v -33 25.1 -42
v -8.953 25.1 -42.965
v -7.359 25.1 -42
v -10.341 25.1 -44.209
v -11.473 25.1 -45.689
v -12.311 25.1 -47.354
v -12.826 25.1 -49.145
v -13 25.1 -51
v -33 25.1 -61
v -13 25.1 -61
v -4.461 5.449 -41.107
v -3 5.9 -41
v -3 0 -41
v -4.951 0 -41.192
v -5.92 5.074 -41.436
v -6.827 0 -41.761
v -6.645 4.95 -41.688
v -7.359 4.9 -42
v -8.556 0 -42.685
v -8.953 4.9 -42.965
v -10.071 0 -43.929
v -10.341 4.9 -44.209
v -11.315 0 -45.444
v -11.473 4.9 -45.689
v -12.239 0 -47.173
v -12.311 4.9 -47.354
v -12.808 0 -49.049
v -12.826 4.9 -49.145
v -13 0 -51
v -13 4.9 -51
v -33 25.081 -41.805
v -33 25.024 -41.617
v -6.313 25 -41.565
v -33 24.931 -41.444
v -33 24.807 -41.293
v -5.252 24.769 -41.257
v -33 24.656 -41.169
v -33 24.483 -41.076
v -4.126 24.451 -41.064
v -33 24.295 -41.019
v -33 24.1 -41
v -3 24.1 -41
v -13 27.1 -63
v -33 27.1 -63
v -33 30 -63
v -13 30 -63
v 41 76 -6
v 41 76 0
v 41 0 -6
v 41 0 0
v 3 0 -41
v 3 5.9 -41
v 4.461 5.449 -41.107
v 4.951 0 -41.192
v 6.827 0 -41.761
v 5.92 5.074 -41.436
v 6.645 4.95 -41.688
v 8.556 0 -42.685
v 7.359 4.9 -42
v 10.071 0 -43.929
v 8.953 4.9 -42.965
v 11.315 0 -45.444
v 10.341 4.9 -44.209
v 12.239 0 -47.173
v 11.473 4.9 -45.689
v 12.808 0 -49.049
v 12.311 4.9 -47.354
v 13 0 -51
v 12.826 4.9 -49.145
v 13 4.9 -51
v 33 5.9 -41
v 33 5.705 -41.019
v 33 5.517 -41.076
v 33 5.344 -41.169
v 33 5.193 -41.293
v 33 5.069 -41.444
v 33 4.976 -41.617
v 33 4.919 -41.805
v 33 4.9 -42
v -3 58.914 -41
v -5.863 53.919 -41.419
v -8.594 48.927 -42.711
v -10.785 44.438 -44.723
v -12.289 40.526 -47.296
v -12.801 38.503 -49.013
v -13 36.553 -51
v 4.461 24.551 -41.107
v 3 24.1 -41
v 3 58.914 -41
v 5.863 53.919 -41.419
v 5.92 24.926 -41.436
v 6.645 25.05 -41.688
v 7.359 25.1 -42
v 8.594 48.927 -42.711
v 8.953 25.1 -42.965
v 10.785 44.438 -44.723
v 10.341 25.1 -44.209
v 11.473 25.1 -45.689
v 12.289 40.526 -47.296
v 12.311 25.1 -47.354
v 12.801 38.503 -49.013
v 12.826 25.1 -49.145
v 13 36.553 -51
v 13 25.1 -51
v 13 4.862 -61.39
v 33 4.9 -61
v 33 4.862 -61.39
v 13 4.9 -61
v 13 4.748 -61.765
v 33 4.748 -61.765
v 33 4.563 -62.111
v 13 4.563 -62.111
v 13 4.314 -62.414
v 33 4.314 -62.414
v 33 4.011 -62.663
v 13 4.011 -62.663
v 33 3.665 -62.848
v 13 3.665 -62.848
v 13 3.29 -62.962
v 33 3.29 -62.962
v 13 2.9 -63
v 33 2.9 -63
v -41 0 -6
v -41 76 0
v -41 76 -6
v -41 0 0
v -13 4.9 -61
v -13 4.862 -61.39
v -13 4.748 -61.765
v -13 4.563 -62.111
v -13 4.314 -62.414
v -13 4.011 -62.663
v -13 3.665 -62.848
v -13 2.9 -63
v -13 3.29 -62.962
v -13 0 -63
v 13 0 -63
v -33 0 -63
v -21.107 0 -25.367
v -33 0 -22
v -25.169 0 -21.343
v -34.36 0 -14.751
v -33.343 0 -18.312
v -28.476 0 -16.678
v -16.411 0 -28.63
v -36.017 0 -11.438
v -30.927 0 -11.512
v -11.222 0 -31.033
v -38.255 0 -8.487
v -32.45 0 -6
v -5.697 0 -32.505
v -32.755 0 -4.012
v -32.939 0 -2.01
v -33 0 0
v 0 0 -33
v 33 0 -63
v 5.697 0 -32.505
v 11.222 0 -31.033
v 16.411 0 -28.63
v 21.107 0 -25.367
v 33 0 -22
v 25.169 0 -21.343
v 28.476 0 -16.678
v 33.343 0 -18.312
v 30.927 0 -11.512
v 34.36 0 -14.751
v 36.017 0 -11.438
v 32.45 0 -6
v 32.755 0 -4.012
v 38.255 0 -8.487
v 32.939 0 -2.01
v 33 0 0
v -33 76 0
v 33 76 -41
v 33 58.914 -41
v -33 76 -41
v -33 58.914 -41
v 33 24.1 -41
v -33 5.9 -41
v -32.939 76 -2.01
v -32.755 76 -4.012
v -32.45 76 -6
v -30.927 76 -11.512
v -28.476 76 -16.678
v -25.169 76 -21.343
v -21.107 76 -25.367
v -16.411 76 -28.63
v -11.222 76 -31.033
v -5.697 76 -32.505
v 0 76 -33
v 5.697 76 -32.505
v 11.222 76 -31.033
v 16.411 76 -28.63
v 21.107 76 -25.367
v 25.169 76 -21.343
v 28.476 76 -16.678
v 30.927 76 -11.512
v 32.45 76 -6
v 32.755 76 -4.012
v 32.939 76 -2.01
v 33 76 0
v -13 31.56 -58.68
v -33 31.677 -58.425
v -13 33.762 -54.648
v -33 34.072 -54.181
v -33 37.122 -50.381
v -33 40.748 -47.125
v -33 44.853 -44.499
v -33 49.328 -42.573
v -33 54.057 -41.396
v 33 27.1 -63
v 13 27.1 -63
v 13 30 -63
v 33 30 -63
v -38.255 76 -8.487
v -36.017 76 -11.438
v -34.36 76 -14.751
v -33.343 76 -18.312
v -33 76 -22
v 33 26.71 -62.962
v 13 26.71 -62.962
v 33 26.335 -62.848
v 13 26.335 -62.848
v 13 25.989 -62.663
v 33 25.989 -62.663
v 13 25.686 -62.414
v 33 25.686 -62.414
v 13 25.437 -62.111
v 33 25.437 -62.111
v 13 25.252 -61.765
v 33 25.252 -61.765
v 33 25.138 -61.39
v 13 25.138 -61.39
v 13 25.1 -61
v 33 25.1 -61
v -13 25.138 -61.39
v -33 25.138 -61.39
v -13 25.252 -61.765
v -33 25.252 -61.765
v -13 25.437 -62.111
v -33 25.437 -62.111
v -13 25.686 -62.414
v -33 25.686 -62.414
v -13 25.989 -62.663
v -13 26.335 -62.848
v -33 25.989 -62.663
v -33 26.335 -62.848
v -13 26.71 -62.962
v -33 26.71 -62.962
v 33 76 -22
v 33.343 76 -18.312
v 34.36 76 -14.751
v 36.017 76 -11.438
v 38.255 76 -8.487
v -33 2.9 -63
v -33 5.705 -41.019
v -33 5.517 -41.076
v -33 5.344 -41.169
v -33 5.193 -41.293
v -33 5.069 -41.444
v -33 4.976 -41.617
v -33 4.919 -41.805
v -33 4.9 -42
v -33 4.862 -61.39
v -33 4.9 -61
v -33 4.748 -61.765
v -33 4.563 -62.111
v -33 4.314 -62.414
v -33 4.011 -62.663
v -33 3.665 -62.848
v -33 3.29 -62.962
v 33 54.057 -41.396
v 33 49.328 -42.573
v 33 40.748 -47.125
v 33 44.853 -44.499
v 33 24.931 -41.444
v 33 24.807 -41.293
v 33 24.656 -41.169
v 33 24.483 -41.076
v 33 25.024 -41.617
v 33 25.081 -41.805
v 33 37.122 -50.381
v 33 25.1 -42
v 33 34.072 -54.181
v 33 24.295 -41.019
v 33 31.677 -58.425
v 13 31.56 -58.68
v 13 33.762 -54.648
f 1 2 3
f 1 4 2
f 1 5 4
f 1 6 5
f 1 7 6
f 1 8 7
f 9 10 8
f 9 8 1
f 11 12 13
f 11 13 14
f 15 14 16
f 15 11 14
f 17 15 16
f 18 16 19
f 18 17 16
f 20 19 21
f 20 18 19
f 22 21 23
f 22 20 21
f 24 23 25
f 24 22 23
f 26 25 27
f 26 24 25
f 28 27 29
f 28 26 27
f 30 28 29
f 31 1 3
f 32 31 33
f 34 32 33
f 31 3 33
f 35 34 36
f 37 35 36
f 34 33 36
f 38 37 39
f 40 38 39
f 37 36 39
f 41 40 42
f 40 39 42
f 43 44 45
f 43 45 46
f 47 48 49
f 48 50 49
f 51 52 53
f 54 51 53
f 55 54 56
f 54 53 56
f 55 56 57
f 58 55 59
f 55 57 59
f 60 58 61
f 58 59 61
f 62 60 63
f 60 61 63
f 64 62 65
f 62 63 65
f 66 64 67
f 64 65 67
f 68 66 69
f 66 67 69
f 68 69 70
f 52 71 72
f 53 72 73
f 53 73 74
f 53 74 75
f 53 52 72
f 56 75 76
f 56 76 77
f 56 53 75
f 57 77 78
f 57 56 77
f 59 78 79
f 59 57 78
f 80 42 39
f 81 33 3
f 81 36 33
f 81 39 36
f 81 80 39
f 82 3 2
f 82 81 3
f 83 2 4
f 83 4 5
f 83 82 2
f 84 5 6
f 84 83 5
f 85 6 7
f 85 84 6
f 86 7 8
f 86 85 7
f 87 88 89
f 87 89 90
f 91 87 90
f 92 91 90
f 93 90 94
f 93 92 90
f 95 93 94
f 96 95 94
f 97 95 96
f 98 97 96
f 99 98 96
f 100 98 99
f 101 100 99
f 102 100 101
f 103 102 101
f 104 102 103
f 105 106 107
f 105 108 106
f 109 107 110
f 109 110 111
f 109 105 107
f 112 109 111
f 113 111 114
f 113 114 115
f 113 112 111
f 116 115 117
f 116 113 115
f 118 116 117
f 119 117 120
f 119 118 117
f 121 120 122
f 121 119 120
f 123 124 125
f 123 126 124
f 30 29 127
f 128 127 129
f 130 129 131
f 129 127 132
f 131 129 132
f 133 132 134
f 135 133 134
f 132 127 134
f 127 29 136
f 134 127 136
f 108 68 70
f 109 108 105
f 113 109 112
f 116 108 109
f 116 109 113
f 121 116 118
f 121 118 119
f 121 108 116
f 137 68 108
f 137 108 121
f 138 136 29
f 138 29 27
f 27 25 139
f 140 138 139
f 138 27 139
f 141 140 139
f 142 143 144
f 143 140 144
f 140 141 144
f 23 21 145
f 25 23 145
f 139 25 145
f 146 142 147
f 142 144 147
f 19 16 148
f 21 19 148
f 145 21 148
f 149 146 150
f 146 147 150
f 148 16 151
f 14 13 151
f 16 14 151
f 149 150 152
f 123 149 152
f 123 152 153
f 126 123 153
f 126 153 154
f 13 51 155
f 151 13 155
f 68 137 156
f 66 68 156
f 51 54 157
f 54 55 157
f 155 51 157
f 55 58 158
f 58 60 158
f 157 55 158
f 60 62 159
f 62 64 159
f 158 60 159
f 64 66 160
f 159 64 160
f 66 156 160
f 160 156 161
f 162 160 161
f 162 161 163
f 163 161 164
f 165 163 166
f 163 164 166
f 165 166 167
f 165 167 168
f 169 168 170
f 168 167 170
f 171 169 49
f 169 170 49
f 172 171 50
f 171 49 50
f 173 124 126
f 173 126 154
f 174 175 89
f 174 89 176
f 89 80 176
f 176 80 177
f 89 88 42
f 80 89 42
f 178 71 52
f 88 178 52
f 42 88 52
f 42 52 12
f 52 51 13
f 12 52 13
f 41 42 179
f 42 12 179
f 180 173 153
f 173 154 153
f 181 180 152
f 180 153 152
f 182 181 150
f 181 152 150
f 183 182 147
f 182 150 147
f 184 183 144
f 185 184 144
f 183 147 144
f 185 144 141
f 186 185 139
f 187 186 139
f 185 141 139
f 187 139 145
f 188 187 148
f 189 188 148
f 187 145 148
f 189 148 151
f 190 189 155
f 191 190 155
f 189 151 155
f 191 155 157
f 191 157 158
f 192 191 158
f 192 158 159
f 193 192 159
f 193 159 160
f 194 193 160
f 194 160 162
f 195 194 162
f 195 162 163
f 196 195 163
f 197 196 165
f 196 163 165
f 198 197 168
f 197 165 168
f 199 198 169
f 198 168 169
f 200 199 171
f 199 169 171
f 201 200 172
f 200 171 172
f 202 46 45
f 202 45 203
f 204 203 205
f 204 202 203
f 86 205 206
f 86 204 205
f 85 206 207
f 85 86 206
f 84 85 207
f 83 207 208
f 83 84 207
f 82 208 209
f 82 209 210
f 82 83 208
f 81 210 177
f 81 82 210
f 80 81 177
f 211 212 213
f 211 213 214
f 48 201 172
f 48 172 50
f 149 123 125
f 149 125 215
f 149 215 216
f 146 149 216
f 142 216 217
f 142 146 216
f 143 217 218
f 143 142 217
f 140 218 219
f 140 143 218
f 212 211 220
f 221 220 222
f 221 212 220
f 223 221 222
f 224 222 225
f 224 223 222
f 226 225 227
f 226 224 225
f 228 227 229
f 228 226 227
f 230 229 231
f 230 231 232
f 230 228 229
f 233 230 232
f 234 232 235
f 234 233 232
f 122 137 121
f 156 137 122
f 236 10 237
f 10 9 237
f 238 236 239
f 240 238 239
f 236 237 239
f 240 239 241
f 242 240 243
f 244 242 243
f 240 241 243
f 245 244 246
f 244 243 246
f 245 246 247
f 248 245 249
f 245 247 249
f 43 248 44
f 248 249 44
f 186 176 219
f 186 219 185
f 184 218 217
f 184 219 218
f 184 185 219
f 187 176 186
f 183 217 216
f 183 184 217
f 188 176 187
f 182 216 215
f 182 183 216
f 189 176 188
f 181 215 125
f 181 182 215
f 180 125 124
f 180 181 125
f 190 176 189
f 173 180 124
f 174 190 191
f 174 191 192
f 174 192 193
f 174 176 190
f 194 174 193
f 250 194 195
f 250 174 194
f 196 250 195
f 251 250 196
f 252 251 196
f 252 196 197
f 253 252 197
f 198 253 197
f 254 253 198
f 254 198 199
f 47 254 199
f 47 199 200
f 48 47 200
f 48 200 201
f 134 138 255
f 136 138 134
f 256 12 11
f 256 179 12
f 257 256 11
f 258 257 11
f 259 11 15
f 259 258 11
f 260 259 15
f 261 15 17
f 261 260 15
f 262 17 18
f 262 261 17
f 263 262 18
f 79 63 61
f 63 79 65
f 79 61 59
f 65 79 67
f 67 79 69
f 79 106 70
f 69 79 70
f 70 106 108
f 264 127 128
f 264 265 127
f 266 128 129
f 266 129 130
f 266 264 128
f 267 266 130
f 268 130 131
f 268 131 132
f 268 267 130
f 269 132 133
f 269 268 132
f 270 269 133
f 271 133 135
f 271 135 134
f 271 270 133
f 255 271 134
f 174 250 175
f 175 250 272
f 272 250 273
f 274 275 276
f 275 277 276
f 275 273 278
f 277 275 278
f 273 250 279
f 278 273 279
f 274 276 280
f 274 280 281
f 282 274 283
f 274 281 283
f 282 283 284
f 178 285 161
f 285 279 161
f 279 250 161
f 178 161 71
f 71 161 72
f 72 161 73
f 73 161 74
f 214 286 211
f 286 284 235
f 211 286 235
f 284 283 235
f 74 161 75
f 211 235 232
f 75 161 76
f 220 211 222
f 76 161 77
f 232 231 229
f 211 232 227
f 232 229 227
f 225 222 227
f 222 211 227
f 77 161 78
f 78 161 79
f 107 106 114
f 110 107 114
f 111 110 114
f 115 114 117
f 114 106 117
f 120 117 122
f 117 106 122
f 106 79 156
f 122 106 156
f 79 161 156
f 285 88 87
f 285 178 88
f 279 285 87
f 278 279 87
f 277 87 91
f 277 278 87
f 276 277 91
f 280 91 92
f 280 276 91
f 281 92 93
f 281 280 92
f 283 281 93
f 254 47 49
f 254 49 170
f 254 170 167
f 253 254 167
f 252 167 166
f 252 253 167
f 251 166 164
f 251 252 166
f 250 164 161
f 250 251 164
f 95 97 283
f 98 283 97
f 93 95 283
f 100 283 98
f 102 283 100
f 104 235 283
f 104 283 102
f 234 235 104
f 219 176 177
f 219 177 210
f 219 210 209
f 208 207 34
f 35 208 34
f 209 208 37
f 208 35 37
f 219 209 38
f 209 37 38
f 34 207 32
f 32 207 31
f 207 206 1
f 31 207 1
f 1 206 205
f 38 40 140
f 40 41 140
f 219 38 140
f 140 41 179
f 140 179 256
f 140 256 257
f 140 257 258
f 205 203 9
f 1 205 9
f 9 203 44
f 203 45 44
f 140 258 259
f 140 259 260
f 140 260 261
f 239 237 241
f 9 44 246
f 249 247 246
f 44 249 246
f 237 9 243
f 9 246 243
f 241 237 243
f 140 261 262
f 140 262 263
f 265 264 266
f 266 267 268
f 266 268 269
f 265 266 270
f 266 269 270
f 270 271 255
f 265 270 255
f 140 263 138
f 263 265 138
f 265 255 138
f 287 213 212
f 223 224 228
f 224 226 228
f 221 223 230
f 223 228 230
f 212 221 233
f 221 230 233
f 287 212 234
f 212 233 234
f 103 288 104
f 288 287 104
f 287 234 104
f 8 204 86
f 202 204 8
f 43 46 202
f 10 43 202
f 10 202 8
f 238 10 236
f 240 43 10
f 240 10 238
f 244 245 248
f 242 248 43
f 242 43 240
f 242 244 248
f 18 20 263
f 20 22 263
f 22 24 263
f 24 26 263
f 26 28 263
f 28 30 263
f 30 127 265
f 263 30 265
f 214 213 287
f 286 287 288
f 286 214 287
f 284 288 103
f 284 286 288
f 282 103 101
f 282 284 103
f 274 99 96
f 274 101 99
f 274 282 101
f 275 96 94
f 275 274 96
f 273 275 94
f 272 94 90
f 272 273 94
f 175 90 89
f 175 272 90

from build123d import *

# Parameters (mm, degrees)
SKETCH1_W           = 8
SKETCH1_H           = 6
SKETCH1_W_2         = 20
SKETCH1_H_2         = 22
BOSS_EXTRUDE1_DEPTH = 30
SKETCH2_W           = 66
SKETCH2_H           = 20.2
CUT_EXTRUDE1_DEPTH  = 22
SKETCH3_W           = 8
SKETCH3_H           = 6
BOSS_EXTRUDE2_DEPTH = 46
FILLET1_R           = 30
FILLET2_R           = 20
FILLET3_R           = 10
FILLET4_R           = 2
FILLET5_R           = 1


with BuildPart() as part:
    # Sketch1 → Boss-Extrude1 (new body)
    with BuildSketch(Plane(origin=(0, 0, 0), x_dir=(1, 0, 0), z_dir=(0, 1, 0))):
        with BuildLine():
            Line((-13, 41), (-33, 41))
            Line((-33, 41), (-33, 6))
            Line((-33, 6), (-32.449961479, 6))
            ThreePointArc((-32.449961479, 6), (0, 33), (32.449961479, 6))
            Line((32.449961479, 6), (33, 6))
            Line((33, 6), (33, 41))
            Line((33, 41), (13, 41))
            Line((13, 41), (-13, 41))
        make_face()
        with Locations((-37, 3)):
            Rectangle(SKETCH1_W, SKETCH1_H)
        with BuildLine():
            Line((-32.449961479, 6), (-33, 6))
            Line((-33, 6), (-33, 0))
            ThreePointArc((-33, 0), (-32.862202671, 3.012579558), (-32.449961479, 6))
        make_face()
        with Locations((37, 3)):
            Rectangle(SKETCH1_W, SKETCH1_H)
        with BuildLine():
            ThreePointArc((32.449961479, 6), (32.862202671, 3.012579558), (33, 0))
            Line((33, 0), (33, 6))
            Line((33, 6), (32.449961479, 6))
        make_face()
        with Locations((-23, 52)):
            Rectangle(SKETCH1_W_2, SKETCH1_H_2)
        with Locations((23, 52)):
            Rectangle(SKETCH1_W_2, SKETCH1_H_2)
    extrude(amount=BOSS_EXTRUDE1_DEPTH)

    # Sketch2 → Cut-Extrude1 (cut)
    with BuildSketch(Plane(origin=(0, 0, -63), x_dir=(-1, 0, 0), z_dir=(0, 0, -1))):
        with Locations((0, 15)):
            Rectangle(SKETCH2_W, SKETCH2_H)
    extrude(amount=-CUT_EXTRUDE1_DEPTH, mode=Mode.SUBTRACT)

    # Sketch3 → Boss-Extrude2 (add)
    with BuildSketch(Plane(origin=(0, 30, 0), x_dir=(1, 0, 0), z_dir=(0, 1, 0))):
        with BuildLine():
            Line((-33, 41), (-33, 6))
            Line((-33, 6), (-32.449961479, 6))
            ThreePointArc((-32.449961479, 6), (0, 33), (32.449961479, 6))
            Line((32.449961479, 6), (33, 6))
            Line((33, 6), (33, 41))
            Line((33, 41), (13, 41))
            Line((13, 41), (-13, 41))
            Line((-13, 41), (-33, 41))
        make_face()
        with Locations((37, 3)):
            Rectangle(SKETCH3_W, SKETCH3_H)
        with Locations((-37, 3)):
            Rectangle(SKETCH3_W, SKETCH3_H)
        with BuildLine():
            Line((-32.449961479, 6), (-33, 6))
            Line((-33, 6), (-33, 0))
            ThreePointArc((-33, 0), (-32.862202671, 3.012579558), (-32.449961479, 6))
        make_face()
        with BuildLine():
            Line((33, 6), (32.449961479, 6))
            ThreePointArc((32.449961479, 6), (32.862202671, 3.012579558), (33, 0))
            Line((33, 0), (33, 6))
        make_face()
    extrude(amount=BOSS_EXTRUDE2_DEPTH)

    # Fillet1
    # the kernel refuses this fillet: 30 mm, written as the material it adds along each edge
    with BuildSketch(Plane(origin=(59.284161474, 30, -41), x_dir=(0, 1, 0), z_dir=(-1, 0, 0))) as fillet1_piece_1_section:
        with BuildLine():
            CenterArc((28.91366459, 30), FILLET1_R, 195.466009953, 74.533990047)
            Line((0, 22), (-0.578273292, 21.84))
            ThreePointArc((-0.578273292, 21.84), (-0.6, 11), (-0.6, 0))
            Line((-0.6, 0), (0, -0.6))
            Line((0, -0.6), (28.91366459, -0.6))
            Line((28.91366459, -0.6), (28.91366459, 0))
        make_face()
    fillet1_piece_1 = extrude(amount=92.284161474, mode=Mode.PRIVATE)
    fillet1_piece_1 = split(fillet1_piece_1, bisect_by=Plane(origin=(33, 36.836030265, -46.582233156), z_dir=(-1, 0, 0)), keep=Keep.TOP, mode=Mode.PRIVATE)
    fillet1_piece_1 = split(fillet1_piece_1, bisect_by=Plane(origin=(13, 36.836030265, -46.582233156), z_dir=(1, 0, 0)), keep=Keep.TOP, mode=Mode.PRIVATE)
    add(fillet1_piece_1)
    with BuildSketch(Plane(origin=(-13, 30, -41), x_dir=(0, 1, 0), z_dir=(-1, 0, 0)), Plane(origin=(33, 30, -41), x_dir=(0, 1, 0), z_dir=(-1, 0, 0))) as fillet1_piece_2:
        with BuildLine():
            CenterArc((28.91366459, 30), FILLET1_R, 195.466009953, 74.533990047)
            Line((0, 22), (-0.578273292, 21.84))
            ThreePointArc((-0.578273292, 21.84), (-0.6, 11), (-0.6, 0))
            Line((-0.6, 0), (0, -0.6))
            Line((0, -0.6), (28.91366459, -0.6))
            Line((28.91366459, -0.6), (28.91366459, 0))
        make_face()
    extrude(amount=20)
    with BuildSketch(Plane(origin=(33, 30, -41), x_dir=(0, 1, 0), z_dir=(-1, 0, 0))) as fillet1_piece_3_section:
        with BuildLine():
            CenterArc((28.91366459, 30), FILLET1_R, 195.466009953, 74.533990047)
            Line((0, 22), (-0.578273292, 21.84))
            ThreePointArc((-0.578273292, 21.84), (-0.6, 11), (-0.6, 0))
            Line((-0.6, 0), (0, -0.6))
            Line((0, -0.6), (28.91366459, -0.6))
            Line((28.91366459, -0.6), (28.91366459, 0))
        make_face()
    fillet1_piece_3 = extrude(amount=92.284161474, mode=Mode.PRIVATE)
    fillet1_piece_3 = split(fillet1_piece_3, bisect_by=Plane(origin=(-33, 36.836030265, -46.582233156), z_dir=(1, 0, 0)), keep=Keep.TOP, mode=Mode.PRIVATE)
    fillet1_piece_3 = split(fillet1_piece_3, bisect_by=Plane(origin=(-13, 36.836030265, -46.582233156), z_dir=(-1, 0, 0)), keep=Keep.TOP, mode=Mode.PRIVATE)
    add(fillet1_piece_3)

    # Fillet2
    # the kernel refuses this fillet: 20 mm, written as the material it adds along each edge
    with BuildSketch(Plane(origin=(33, 76, -6), x_dir=(0, 0, -1), z_dir=(0, -1, 0)), Plane(origin=(-33, 0, -6), x_dir=(0, 0, -1), z_dir=(0, 1, 0))) as fillet2_piece_1:
        with BuildLine():
            CenterArc((16, 20), FILLET2_R, 216.869897646, 53.130102354)
            Line((0, 8), (-0.32, 7.76))
            ThreePointArc((-0.32, 7.76), (-0.4, 4), (-0.4, 0))
            Line((-0.4, 0), (0, -0.4))
            Line((0, -0.4), (16, -0.4))
            Line((16, -0.4), (16, 0))
        make_face()
    extrude(amount=76)

    # Fillet3
    fillet3_edges = [part.edges().sort_by_distance(p)[0] for p in [
        (-13, 42.006832295, -41),
        (13, 2.45, -41),
        (13, 42.006832295, -41),
        (-13, 2.45, -41),
    ]]
    fillet(fillet3_edges, radius=FILLET3_R)

    # Fillet4
    fillet4_edges = [part.edges().sort_by_distance(p)[0] for p in [
        (-23, 25.1, -63),
        (-23, 4.9, -63),
        (23, 25.1, -63),
        (23, 4.9, -63),
    ]]
    fillet(fillet4_edges, radius=FILLET4_R)

    # Fillet5
    fillet5_edges = [part.edges().sort_by_distance(p)[0] for p in [
        (-18, 25.1, -41),
        (-18, 4.9, -41),
        (18, 25.1, -41),
        (18, 4.9, -41),
    ]]
    fillet(fillet5_edges, radius=FILLET5_R)


solid = part.part
